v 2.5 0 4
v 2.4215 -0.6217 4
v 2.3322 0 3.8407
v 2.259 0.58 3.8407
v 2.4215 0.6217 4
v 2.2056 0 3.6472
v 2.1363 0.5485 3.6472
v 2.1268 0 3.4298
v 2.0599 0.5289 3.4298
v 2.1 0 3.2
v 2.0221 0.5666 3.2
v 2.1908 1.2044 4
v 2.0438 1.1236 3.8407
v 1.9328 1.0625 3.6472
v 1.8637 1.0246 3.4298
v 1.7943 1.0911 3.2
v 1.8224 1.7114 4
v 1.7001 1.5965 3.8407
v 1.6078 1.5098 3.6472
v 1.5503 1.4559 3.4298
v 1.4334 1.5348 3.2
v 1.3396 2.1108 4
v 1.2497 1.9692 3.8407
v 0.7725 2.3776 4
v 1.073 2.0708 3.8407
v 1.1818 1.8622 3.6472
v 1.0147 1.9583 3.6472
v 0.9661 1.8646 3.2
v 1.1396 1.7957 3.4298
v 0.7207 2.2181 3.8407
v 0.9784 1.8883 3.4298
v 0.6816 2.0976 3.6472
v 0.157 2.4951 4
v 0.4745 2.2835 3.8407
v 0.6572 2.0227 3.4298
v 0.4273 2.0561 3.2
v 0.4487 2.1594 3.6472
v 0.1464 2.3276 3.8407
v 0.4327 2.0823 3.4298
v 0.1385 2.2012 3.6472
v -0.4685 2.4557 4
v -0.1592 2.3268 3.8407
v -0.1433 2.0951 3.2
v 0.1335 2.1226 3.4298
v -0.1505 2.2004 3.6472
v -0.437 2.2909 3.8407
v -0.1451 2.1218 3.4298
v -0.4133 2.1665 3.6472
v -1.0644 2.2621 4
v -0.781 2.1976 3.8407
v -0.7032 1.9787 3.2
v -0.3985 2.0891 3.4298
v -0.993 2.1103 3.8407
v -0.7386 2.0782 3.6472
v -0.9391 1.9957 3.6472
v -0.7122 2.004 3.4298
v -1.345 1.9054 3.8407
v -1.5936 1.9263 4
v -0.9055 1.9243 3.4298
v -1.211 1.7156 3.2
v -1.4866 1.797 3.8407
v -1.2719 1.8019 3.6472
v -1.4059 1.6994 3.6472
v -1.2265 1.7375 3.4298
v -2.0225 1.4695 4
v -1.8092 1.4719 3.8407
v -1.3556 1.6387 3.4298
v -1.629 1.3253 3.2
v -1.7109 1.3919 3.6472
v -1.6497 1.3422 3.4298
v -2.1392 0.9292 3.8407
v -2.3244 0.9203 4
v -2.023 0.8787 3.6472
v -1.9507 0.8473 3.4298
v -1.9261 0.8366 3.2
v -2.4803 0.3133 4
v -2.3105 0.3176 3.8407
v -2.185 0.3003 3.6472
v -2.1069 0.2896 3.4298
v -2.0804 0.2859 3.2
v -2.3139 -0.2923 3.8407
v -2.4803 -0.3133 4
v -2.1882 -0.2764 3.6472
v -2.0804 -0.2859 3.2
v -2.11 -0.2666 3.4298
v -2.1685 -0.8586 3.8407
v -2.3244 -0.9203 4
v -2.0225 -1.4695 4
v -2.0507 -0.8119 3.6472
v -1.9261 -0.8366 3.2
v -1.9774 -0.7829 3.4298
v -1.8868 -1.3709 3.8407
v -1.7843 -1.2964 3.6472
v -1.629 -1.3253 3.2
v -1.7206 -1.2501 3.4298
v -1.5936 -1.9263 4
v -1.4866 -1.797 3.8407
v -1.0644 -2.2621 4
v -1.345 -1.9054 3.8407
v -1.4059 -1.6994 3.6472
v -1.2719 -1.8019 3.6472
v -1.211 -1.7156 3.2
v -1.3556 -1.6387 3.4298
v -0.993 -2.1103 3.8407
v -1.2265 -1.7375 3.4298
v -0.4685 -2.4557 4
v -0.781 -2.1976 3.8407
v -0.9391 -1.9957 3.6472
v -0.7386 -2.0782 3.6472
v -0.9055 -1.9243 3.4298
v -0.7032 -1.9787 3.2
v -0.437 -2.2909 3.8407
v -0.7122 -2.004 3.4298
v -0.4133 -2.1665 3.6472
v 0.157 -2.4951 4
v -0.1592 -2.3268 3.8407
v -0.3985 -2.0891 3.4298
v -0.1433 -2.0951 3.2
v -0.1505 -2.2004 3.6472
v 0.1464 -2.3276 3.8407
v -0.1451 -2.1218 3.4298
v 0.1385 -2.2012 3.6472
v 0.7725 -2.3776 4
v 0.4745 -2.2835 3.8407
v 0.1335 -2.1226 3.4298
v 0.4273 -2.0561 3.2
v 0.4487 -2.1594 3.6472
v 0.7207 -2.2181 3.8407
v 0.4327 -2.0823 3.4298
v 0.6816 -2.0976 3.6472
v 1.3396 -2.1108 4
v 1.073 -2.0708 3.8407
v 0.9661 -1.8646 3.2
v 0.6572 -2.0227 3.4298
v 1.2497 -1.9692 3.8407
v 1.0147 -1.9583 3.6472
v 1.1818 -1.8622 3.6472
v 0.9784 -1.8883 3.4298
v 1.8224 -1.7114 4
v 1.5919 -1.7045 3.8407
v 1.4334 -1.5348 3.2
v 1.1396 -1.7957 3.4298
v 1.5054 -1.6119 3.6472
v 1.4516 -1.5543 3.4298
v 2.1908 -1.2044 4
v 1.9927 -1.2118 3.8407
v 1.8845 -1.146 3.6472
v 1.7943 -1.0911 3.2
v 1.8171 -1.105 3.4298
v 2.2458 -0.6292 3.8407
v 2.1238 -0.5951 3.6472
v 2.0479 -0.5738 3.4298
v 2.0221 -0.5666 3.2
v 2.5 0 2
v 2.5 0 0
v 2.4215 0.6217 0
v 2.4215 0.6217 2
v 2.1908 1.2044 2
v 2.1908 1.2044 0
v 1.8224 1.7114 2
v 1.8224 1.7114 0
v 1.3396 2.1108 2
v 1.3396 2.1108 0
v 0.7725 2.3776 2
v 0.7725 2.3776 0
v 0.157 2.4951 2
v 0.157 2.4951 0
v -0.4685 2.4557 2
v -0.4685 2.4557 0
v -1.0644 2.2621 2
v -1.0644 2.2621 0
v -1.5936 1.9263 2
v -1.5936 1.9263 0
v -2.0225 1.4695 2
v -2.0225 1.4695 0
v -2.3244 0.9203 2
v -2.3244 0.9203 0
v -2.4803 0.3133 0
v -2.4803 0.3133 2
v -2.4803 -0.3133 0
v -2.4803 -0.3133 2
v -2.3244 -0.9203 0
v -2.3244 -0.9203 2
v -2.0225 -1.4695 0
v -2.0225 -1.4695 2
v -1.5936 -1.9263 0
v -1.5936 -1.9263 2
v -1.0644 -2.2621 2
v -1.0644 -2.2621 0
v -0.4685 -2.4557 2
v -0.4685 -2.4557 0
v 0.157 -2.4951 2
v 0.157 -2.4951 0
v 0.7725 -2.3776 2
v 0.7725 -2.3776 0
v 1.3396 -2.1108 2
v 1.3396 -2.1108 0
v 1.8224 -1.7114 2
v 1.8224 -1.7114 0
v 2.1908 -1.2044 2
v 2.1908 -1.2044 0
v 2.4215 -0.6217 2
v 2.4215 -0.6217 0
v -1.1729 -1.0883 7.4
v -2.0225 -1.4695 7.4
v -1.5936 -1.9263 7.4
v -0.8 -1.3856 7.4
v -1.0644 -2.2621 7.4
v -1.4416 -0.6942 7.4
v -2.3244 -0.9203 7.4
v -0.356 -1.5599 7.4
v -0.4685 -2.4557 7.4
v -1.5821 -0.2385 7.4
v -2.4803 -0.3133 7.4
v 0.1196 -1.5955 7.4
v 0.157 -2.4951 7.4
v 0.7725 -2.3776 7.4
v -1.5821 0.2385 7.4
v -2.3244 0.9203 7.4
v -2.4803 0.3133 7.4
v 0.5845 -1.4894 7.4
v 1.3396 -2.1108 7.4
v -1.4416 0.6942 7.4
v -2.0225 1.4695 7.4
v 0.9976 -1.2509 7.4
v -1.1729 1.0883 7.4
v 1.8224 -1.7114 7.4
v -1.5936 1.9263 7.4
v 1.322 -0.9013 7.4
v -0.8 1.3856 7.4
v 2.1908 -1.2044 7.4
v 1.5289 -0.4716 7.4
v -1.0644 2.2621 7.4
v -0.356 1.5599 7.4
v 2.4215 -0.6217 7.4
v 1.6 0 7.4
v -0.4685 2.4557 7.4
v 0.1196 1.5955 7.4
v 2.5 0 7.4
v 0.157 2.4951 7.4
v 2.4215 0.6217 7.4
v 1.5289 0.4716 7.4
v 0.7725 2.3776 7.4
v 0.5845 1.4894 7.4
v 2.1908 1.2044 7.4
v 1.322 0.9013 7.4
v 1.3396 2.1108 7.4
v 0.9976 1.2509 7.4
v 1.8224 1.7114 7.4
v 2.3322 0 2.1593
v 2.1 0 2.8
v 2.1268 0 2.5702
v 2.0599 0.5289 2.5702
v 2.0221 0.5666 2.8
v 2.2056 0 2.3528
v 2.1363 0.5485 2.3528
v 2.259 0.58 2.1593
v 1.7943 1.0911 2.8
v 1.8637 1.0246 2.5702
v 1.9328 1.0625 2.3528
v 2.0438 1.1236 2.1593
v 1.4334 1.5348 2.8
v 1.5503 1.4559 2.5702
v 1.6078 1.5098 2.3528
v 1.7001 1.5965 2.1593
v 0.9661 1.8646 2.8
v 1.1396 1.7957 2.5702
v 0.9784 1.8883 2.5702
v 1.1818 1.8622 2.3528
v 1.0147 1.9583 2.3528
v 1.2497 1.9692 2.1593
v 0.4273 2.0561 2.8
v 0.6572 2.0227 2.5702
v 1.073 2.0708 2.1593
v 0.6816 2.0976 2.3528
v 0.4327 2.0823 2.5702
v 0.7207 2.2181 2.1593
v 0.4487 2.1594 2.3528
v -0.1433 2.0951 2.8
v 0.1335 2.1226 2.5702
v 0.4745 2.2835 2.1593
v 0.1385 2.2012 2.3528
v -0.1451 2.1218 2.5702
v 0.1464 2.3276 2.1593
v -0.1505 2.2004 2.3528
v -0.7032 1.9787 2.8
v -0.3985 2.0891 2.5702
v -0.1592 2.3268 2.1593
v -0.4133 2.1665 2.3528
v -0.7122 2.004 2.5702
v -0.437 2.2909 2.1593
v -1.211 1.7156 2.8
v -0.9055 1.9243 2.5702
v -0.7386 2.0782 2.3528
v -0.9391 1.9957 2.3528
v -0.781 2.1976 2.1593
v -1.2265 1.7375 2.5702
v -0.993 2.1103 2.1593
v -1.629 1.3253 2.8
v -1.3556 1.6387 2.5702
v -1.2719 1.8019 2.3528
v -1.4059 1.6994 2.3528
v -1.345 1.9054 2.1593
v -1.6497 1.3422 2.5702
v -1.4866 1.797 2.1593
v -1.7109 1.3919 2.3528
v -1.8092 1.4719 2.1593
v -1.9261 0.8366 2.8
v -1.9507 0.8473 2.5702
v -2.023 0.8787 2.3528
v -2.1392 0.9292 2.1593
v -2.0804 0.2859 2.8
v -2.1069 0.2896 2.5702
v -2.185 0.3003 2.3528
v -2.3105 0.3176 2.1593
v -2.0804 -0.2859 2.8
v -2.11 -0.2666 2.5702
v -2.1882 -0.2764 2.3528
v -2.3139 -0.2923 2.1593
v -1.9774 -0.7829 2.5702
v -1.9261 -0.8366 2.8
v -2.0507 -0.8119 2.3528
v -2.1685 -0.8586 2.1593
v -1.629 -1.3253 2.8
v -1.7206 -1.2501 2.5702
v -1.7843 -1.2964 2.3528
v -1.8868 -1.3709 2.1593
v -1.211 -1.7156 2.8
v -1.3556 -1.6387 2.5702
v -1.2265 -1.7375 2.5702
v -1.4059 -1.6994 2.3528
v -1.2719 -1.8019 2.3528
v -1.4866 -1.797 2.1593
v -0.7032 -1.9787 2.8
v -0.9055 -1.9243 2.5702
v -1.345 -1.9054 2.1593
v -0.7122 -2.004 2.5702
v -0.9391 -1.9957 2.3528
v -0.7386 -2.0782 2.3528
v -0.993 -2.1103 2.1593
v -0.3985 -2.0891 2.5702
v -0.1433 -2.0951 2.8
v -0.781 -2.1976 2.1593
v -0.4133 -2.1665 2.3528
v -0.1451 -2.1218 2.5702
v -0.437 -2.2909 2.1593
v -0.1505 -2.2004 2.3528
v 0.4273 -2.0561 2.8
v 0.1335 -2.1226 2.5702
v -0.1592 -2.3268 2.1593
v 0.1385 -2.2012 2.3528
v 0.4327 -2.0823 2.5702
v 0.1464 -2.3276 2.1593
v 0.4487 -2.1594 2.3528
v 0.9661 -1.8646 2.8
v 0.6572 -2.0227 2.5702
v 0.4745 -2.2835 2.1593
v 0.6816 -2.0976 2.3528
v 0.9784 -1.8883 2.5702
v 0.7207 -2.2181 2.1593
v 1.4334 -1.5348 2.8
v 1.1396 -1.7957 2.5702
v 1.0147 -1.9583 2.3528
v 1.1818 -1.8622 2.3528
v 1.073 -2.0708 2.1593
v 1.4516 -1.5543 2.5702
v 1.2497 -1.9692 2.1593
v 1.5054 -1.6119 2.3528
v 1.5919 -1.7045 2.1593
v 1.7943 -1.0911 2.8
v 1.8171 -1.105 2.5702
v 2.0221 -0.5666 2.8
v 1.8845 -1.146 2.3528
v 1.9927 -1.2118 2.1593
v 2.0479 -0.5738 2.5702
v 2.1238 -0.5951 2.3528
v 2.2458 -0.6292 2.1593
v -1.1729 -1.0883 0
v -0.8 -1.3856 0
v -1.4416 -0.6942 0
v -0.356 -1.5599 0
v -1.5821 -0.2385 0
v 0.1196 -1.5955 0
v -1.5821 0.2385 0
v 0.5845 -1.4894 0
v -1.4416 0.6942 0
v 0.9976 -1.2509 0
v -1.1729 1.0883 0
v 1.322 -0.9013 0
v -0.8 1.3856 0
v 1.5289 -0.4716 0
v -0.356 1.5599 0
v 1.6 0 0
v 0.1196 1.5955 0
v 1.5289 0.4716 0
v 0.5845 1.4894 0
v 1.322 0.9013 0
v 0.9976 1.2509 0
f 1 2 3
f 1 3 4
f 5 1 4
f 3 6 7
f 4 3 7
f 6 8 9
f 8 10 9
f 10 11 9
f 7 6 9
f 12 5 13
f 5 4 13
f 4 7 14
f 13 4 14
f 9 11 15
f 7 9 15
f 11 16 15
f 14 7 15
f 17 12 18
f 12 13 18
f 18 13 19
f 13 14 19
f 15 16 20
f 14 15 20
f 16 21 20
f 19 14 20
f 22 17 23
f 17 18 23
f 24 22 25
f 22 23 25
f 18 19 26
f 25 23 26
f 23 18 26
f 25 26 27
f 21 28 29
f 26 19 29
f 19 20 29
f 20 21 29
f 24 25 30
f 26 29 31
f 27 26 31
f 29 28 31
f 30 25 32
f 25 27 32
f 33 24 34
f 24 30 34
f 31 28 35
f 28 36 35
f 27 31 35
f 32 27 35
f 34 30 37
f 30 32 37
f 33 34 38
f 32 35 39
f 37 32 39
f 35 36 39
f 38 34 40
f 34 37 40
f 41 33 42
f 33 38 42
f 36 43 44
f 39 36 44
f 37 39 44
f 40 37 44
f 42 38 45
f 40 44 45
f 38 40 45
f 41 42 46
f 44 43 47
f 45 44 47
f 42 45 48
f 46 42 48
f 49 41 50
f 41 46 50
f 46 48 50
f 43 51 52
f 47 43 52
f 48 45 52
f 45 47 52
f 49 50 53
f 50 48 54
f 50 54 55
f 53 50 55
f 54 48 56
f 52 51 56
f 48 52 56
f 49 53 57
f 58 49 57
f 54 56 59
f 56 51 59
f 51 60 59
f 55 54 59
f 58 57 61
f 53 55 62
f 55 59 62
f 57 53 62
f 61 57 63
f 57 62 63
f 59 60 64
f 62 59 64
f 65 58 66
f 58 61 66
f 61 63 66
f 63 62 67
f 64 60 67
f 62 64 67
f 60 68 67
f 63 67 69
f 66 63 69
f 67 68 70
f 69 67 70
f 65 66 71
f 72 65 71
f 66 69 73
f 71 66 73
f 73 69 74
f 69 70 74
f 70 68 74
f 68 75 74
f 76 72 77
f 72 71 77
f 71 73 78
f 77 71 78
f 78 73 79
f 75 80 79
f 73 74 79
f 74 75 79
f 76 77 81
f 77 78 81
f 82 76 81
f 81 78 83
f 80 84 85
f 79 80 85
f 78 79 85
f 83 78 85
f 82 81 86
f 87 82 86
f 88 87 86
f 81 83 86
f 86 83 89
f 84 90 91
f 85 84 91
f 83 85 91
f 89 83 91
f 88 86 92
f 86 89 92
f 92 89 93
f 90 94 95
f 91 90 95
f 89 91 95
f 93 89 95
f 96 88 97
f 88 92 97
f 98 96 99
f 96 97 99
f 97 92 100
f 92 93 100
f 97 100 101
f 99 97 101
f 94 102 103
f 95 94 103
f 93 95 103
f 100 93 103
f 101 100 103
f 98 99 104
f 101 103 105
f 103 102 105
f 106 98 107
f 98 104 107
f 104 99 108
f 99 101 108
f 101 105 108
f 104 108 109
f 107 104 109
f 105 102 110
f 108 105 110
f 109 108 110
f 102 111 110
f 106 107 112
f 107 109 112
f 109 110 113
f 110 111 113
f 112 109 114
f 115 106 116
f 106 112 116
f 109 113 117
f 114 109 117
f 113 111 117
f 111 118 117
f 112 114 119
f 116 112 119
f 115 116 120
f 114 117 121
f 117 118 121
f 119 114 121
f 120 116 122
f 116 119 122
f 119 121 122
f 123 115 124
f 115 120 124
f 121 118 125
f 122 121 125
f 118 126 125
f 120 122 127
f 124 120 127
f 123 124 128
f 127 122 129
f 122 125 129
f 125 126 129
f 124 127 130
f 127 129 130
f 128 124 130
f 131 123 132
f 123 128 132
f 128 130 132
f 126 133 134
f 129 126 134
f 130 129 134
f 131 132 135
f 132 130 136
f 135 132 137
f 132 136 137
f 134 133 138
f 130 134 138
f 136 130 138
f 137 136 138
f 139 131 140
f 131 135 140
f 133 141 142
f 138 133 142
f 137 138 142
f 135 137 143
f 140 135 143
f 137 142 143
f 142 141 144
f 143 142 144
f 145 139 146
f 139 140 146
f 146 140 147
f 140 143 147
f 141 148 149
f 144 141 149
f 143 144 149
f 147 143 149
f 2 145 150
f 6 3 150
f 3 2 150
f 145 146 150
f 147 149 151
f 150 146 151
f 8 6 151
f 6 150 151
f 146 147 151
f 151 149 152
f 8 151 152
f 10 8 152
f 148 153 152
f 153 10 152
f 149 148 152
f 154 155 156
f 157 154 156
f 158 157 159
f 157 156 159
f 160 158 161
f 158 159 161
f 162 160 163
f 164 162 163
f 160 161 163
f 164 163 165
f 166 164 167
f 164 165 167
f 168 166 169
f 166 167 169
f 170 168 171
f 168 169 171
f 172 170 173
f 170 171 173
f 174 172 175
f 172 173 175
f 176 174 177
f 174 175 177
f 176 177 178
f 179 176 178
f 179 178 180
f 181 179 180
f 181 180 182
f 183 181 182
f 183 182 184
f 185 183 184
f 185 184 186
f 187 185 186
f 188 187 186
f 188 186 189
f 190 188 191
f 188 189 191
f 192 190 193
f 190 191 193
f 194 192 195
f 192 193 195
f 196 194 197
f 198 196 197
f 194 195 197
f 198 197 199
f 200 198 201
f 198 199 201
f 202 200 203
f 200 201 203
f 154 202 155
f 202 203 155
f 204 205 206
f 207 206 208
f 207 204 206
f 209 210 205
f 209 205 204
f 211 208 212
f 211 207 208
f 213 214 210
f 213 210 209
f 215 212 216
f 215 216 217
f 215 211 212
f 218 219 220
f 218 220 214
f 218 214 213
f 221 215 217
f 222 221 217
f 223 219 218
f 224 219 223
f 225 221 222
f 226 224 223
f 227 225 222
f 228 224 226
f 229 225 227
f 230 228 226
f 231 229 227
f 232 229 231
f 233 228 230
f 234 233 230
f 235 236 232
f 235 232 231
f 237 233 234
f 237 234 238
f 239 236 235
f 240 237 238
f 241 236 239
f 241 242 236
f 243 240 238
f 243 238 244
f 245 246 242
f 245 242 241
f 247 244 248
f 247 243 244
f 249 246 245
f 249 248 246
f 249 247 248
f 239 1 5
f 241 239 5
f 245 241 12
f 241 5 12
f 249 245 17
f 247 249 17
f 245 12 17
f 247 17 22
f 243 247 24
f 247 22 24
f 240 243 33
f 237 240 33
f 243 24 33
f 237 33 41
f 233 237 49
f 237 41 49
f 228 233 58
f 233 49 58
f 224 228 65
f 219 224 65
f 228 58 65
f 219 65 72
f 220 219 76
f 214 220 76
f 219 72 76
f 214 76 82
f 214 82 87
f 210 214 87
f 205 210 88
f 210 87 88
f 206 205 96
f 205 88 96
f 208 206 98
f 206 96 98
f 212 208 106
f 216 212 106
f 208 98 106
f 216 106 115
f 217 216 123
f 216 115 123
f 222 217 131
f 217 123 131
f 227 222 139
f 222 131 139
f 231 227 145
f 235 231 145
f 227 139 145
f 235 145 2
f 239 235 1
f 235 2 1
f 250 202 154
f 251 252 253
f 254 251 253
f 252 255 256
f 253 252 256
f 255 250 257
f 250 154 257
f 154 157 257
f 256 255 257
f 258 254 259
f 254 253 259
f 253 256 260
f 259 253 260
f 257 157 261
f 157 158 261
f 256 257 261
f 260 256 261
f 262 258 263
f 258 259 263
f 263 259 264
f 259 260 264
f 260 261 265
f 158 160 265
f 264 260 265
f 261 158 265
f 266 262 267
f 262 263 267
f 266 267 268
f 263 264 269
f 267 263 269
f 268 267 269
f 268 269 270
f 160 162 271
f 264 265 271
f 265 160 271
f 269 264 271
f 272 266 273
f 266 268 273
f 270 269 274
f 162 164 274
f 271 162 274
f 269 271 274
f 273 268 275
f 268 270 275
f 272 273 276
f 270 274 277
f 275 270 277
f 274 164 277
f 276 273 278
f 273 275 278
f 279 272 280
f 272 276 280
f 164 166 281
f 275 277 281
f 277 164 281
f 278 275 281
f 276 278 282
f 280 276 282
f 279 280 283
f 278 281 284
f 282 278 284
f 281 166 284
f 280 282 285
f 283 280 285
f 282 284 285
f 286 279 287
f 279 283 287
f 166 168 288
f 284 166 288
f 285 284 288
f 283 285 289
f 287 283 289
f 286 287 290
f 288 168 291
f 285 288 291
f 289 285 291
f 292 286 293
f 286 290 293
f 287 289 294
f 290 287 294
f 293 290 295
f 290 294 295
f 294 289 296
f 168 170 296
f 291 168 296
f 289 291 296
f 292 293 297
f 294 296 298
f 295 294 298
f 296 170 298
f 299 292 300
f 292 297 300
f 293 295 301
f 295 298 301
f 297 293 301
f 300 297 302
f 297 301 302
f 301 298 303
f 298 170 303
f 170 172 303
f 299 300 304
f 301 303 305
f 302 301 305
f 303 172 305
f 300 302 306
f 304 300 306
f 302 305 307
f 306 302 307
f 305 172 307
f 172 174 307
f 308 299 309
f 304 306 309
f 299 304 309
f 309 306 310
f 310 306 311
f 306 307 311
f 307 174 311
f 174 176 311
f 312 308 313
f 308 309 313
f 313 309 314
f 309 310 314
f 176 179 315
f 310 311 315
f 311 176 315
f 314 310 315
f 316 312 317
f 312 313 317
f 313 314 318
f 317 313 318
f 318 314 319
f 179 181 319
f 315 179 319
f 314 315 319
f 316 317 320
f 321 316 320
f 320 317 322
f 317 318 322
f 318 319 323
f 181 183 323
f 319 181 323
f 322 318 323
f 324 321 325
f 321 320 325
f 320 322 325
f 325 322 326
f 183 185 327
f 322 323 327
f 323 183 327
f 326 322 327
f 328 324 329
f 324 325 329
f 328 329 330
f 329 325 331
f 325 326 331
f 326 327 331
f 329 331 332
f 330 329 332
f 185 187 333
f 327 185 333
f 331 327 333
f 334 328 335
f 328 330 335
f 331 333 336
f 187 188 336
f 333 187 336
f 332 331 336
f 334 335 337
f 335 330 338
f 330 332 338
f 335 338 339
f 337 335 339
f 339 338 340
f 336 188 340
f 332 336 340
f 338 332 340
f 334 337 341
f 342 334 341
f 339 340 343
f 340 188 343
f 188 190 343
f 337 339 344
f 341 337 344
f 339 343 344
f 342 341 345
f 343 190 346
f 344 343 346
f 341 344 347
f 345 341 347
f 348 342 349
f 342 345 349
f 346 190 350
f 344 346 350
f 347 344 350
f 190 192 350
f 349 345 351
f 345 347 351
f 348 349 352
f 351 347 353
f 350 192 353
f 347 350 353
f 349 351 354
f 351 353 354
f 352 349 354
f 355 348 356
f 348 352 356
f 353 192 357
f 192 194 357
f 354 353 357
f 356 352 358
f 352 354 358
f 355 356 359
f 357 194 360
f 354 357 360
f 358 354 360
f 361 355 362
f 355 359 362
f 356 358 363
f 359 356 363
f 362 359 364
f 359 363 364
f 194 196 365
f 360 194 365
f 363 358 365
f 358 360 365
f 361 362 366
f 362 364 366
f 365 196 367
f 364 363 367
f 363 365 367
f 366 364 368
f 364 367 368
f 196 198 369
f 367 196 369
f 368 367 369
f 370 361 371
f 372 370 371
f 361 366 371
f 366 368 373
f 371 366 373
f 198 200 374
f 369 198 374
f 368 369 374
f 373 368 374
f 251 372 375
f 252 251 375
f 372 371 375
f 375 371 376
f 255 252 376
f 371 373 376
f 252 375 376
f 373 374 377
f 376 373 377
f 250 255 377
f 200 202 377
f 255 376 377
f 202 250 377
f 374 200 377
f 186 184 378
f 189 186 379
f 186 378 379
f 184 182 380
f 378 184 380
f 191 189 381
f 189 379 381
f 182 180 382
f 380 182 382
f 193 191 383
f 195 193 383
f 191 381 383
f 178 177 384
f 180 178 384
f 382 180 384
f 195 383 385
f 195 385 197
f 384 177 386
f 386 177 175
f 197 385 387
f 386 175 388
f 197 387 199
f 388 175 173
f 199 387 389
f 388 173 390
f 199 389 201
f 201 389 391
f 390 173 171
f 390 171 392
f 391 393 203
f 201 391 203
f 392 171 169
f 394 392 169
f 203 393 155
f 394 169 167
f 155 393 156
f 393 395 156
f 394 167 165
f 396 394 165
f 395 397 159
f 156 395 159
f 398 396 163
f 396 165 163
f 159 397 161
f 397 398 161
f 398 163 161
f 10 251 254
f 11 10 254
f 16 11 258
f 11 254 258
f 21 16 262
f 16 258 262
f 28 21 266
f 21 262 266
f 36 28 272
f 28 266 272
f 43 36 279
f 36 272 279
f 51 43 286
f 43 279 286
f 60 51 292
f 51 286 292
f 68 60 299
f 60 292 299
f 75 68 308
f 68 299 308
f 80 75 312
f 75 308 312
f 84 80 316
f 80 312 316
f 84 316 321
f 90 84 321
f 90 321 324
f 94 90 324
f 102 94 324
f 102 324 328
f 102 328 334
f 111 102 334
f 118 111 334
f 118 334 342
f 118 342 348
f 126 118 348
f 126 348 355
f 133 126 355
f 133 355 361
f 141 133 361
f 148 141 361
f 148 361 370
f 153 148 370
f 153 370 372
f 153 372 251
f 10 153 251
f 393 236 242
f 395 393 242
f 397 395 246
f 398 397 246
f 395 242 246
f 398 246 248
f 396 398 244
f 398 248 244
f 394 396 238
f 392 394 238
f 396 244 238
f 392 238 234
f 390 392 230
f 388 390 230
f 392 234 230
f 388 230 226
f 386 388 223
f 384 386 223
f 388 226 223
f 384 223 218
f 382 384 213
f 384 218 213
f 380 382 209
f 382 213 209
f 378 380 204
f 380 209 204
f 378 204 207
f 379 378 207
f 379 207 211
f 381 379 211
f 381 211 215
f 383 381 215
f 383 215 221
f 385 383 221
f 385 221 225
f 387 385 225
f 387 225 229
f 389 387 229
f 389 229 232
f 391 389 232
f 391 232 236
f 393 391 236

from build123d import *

# Parameters (mm, degrees)
SKETCH_1_R          = 2.5
EXTRUDE_1_DEPTH     = 2
SKETCH_2_R          = 2.1
EXTRUDE_2_DEPTH     = 2
SKETCH_3_R          = 2.5
EXTRUDE_3_DEPTH     = 3.4
SKETCH_4_R          = 1.6
CUT_EXTRUDE_1_DEPTH = 9.201219422
FILLET_1_R          = 1


with BuildPart() as part:
    # Эскиз1 → Бобышка-Вытянуть1 (new body)
    with BuildSketch(Plane.XY):
        Circle(SKETCH_1_R)
    extrude(amount=EXTRUDE_1_DEPTH)

    # Эскиз2 → Бобышка-Вытянуть2 (add)
    with BuildSketch(Plane.XY.offset(2)):
        Circle(SKETCH_2_R)
    extrude(amount=EXTRUDE_2_DEPTH)

    # Эскиз3 → Бобышка-Вытянуть3 (add)
    with BuildSketch(Plane.XY.offset(4)):
        Circle(SKETCH_3_R)
    extrude(amount=EXTRUDE_3_DEPTH)

    # Эскиз4 → Вырез-Вытянуть1 (cut, through all)
    with BuildSketch(Plane.XY.offset(7.4)):
        Circle(SKETCH_4_R)
    extrude(amount=-CUT_EXTRUDE_1_DEPTH, mode=Mode.SUBTRACT)

    # Скругление1
    # the kernel refuses this fillet: 1 mm, written as the material it adds along each edge
    with BuildSketch(Plane(origin=(0, 0, 2), x_dir=(1, 0, 0), z_dir=(0, -1, 0))) as fillet_1_piece_1:
        with BuildLine():
            CenterArc((3.1, 0.8), FILLET_1_R, 180, 53.130102354)
            Line((2.5, 0), (2.488, -0.016))
            ThreePointArc((2.488, -0.016), (2.3, -0.02), (2.1, -0.02))
            Line((2.1, -0.02), (2.08, 0))
            Line((2.08, 0), (2.08, 0.8))
            Line((2.08, 0.8), (2.1, 0.8))
        make_face()
    revolve(axis=Axis((0, 0, 2), (0, 0, 1)))
    with BuildSketch(Plane(origin=(0, 0, 4), x_dir=(1, 0, 0), z_dir=(0, -1, 0))) as fillet_1_piece_2:
        with BuildLine():
            CenterArc((3.1, -0.8), FILLET_1_R, 126.869897646, 53.130102354)
            Line((2.1, -0.8), (2.08, -0.8))
            Line((2.08, -0.8), (2.08, 0))
            Line((2.08, 0), (2.1, 0.02))
            ThreePointArc((2.1, 0.02), (2.3, 0.02), (2.488, 0.016))
            Line((2.488, 0.016), (2.5, 0))
        make_face()
    revolve(axis=Axis((0, 0, 4), (0, 0, 1)))


solid = part.part
